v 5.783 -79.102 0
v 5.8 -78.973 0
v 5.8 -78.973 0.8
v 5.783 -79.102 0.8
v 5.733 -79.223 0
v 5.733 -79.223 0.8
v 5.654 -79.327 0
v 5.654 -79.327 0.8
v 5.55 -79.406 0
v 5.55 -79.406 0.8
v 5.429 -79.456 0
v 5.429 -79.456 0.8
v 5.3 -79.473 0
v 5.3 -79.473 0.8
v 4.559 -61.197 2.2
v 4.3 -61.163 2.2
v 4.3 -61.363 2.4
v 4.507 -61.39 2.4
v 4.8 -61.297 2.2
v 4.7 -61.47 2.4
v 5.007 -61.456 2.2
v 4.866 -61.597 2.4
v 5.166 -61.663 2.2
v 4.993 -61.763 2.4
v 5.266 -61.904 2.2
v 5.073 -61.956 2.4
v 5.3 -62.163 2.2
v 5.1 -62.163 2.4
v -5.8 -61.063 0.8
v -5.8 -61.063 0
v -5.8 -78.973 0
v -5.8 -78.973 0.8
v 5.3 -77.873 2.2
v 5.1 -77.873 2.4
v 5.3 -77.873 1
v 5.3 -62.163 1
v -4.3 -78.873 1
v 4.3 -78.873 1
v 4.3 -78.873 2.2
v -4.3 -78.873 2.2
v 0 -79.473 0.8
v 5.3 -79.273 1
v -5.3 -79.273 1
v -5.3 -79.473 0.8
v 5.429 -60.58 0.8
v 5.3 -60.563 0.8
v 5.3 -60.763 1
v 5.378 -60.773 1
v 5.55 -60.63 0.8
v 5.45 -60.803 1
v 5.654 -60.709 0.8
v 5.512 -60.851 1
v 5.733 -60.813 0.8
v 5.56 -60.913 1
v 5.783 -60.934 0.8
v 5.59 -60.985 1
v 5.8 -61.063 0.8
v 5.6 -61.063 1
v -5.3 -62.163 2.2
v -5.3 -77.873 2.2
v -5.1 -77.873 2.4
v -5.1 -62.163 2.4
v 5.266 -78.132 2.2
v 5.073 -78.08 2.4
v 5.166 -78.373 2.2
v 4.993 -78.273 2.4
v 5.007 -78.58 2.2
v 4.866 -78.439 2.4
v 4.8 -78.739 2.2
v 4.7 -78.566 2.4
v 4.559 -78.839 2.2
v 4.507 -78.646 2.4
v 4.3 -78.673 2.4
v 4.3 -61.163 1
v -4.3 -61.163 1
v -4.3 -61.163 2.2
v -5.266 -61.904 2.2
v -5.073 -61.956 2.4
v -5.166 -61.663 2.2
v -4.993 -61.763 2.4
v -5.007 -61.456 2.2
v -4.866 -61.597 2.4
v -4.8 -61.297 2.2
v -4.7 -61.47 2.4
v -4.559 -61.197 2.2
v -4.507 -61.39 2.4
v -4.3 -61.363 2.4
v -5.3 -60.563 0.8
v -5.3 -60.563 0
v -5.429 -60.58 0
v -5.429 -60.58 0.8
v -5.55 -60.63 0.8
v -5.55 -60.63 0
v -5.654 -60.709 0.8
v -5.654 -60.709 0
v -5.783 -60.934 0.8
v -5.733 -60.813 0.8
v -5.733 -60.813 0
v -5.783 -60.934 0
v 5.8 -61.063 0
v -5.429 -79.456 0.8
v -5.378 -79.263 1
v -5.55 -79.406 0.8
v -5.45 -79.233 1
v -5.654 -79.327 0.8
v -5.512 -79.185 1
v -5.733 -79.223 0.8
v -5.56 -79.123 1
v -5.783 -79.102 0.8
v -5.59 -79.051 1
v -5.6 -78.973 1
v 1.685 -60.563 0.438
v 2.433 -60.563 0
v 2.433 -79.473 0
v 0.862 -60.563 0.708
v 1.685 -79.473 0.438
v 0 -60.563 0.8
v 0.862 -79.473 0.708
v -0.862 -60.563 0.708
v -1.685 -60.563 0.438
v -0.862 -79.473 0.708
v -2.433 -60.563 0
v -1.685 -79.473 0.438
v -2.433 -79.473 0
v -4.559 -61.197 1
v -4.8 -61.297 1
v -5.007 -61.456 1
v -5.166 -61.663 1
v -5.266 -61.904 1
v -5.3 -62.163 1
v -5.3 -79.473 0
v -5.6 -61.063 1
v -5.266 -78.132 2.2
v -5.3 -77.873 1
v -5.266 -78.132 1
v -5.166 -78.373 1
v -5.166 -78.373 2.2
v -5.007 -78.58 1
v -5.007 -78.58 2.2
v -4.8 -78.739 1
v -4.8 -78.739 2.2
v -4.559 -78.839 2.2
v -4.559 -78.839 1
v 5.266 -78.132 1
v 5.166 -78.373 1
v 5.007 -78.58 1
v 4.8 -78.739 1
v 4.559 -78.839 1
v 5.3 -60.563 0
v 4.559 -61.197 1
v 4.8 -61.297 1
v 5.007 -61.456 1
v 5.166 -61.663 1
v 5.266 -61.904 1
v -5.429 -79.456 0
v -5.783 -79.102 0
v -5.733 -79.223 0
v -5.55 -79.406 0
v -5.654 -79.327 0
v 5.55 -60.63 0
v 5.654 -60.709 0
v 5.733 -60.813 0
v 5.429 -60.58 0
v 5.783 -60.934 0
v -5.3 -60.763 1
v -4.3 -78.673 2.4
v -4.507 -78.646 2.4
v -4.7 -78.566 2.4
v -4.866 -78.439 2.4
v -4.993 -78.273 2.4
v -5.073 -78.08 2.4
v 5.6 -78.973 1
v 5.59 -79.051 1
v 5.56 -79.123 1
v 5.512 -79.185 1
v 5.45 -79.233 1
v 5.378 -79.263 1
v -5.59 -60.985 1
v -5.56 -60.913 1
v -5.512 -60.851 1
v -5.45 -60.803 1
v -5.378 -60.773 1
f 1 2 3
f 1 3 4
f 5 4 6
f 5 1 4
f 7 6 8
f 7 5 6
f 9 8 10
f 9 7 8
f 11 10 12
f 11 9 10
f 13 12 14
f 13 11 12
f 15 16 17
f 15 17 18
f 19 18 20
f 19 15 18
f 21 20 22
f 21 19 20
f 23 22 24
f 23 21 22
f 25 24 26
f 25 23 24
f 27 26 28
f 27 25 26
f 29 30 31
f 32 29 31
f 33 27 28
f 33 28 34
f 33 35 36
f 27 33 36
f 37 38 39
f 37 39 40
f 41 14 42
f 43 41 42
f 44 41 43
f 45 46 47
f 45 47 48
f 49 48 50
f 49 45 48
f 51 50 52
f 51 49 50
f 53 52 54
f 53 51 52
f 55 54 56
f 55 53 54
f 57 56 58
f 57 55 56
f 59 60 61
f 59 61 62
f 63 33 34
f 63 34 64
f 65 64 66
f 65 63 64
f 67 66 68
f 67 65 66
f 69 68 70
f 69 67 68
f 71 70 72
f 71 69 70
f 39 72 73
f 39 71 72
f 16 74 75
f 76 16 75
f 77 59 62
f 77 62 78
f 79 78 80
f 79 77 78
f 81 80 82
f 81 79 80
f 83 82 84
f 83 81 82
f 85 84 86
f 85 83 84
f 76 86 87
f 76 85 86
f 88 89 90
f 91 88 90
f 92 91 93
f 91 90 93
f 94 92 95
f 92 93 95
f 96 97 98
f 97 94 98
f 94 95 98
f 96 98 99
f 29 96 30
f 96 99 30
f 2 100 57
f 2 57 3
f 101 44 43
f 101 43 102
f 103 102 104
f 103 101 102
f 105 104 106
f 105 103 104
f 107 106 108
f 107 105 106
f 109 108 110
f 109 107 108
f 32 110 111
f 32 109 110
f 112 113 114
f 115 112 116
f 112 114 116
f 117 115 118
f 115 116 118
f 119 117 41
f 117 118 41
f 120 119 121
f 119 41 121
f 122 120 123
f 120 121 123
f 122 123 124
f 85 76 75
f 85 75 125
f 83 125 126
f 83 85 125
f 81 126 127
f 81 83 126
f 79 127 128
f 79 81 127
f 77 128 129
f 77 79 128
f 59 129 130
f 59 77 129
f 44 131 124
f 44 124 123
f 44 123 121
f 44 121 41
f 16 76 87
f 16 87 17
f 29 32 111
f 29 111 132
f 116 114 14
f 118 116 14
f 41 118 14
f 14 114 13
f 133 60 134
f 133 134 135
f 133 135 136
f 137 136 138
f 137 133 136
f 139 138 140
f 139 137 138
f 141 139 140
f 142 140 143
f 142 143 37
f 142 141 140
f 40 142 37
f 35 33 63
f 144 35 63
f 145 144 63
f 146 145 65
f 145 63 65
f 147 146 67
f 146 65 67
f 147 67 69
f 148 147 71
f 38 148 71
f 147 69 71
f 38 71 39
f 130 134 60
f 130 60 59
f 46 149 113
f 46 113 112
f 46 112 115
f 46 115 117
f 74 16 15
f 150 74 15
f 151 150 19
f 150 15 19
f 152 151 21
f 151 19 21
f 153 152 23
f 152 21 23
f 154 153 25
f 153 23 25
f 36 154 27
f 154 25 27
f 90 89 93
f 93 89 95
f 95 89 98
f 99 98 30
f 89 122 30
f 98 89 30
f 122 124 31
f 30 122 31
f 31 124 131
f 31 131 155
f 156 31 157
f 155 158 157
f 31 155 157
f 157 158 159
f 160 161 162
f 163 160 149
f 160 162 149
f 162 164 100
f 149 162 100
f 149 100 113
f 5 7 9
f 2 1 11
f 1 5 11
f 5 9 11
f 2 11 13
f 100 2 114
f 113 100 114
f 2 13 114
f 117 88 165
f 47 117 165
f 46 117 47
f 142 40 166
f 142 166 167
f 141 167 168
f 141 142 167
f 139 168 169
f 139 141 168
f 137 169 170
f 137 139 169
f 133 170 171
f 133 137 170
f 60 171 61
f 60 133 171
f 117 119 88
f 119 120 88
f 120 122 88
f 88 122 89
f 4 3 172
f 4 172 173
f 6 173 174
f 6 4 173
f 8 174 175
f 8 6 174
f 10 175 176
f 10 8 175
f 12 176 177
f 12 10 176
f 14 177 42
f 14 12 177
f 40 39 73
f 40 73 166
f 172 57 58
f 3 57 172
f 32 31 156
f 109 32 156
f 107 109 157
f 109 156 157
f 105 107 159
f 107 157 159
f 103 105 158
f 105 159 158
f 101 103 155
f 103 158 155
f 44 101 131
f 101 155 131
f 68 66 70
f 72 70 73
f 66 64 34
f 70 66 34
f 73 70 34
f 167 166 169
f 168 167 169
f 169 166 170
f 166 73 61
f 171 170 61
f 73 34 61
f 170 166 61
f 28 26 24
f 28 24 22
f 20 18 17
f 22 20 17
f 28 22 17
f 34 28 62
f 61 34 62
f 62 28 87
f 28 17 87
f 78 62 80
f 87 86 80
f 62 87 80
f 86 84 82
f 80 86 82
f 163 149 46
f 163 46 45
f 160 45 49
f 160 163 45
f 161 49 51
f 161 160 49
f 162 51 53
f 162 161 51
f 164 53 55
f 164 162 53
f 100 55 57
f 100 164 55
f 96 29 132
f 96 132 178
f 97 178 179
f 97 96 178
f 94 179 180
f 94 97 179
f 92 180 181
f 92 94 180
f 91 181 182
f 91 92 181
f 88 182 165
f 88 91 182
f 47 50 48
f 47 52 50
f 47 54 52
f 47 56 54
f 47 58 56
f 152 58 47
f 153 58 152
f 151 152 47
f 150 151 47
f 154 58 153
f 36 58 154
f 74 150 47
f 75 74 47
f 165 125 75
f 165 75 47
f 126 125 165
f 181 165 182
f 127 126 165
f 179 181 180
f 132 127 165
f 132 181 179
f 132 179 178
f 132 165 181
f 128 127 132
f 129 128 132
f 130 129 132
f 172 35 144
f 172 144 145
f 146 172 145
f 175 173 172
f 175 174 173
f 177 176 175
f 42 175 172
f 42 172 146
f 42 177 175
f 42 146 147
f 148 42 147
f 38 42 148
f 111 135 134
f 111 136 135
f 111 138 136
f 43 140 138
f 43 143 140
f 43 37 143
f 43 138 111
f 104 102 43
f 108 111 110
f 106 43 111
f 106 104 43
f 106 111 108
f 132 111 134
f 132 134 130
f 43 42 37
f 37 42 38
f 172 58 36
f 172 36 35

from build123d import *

# Parameters (mm, degrees)
EXTRUDE_1_DEPTH     = 1
SKETCH_3_W          = 5.3
SKETCH_3_H          = 17.71
EXTRUDE_2_DEPTH     = 1.4
FILLET_1_R          = 1
CHAMFER_1_SIZE      = 0.2
CUT_EXTRUDE_1_DEPTH = 0.5
SKETCH_5_R          = 4.1
CUT_EXTRUDE_2_DEPTH = 20.924560345


with BuildPart() as part:
    # 草图1 → 凸台-拉伸1 (new body)
    with BuildSketch(Plane(origin=(0, 0, 0), x_dir=(-1, 0, 0), z_dir=(0, 0, 1))):
        with BuildLine():
            Line((-5.8, 61.063), (-5.8, 78.973))
            ThreePointArc((-5.8, 78.973), (-5.653553391, 79.32655339), (-5.3, 79.473))
            Line((-5.3, 79.473), (0, 79.473))
            Line((0, 79.473), (0, 60.563))
            Line((0, 60.563), (-5.3, 60.563))
            ThreePointArc((-5.3, 60.563), (-5.653553391, 60.709446609), (-5.8, 61.063))
        make_face()
    extrude(amount=EXTRUDE_1_DEPTH)

    # 草图3 → 凸台-拉伸2 (add)
    with BuildSketch(Plane.XY.offset(1)):
        with Locations((2.65, -70.018)):
            Rectangle(SKETCH_3_W, SKETCH_3_H)
    extrude(amount=EXTRUDE_2_DEPTH)

    # 圆角1
    fillet_1_edges = [part.edges().sort_by_distance(p)[0] for p in [
        (5.3, -61.163, 1.7),
        (5.3, -78.873, 1.7),
    ]]
    fillet(fillet_1_edges, radius=FILLET_1_R)

    # 镜向1: part across plane


with BuildPart() as part_1:
    add(part.part)
    add(part.part.mirror(Plane(origin=(0, -79.473, 1), x_dir=(0, 0, 1), z_dir=(1, 0, 0))))

    # 倒角1
    chamfer_1_edges = [part_1.edges().sort_by_distance(p)[0] for p in [
        (5.653553391, -60.709446609, 1),
        (0, -60.563, 1),
        (0, -79.473, 1),
        (0, -78.873, 2.4),
        (0, -61.163, 2.4),
        (5.3, -70.018, 2.4),
        (5.007106781, -78.580106781, 2.4),
        (5.007106781, -61.455893219, 2.4),
        (5.653553391, -79.32655339, 1),
        (-5.653553391, -79.32655339, 1),
        (-5.8, -70.018, 1),
        (-5.653553391, -60.709446609, 1),
        (-5.3, -70.018, 2.4),
        (-5.007106781, -61.455893219, 2.4),
        (-5.007106781, -78.580106781, 2.4),
        (5.8, -70.018, 1),
    ]]
    chamfer(chamfer_1_edges, length=CHAMFER_1_SIZE)

    # 草图4 → 切除-拉伸1 (cut)
    # profile 1 of 9: a face of its own
    with BuildSketch(Plane(origin=(-6.3, -79.273, 0), x_dir=(1, 0, 0), z_dir=(0, 0, 1))):
        with BuildLine():
            add(Edge.make_bspline(
                [(6.774685953, 2.619341222), (6.800289884, 2.617747441), (6.850993025, 2.614591298), (6.925350933, 2.600827188), (6.996555647, 2.579095321), (7.064787892, 2.55036601), (7.129545424, 2.513432463), (7.190880782, 2.468744026), (7.248477435, 2.416001945), (7.302842533, 2.356884778), (7.35236013, 2.291759099), (7.396108136, 2.221845326), (7.432464761, 2.147203781), (7.463443618, 2.069005381), (7.487749635, 1.986705734), (7.505943631, 1.900454217), (7.517046754, 1.809855564), (7.519723963, 1.747989925), (7.521090297, 1.716416298)],
                knots=[0, 0, 0, 0, 0.94827468, 1.87785632, 2.789222779, 3.697428247, 4.610539481, 5.540471281, 6.498511082, 7.494592211, 8.507455324, 9.520496994, 10.539928136, 11.574155348, 12.628388138, 13.710074165, 14.831317928, 16, 16, 16, 16], degree=3))
            add(Edge.make_bspline(
                [(7.521090297, 1.716416298), (7.519727673, 1.684841903), (7.517057736, 1.622974757), (7.505882914, 1.532228766), (7.487825449, 1.44578553), (7.463435671, 1.363341058), (7.432466847, 1.285140562), (7.396107558, 1.210499646), (7.352360383, 1.140585414), (7.302842101, 1.075460941), (7.248478866, 1.016339529), (7.190875764, 0.963612474), (7.129563419, 0.918870324), (7.064666385, 0.8821006), (6.996680813, 0.852631121), (6.925333473, 0.831071458), (6.85085853, 0.817225267), (6.800008805, 0.81409757), (6.774261029, 0.812513859)],
                knots=[0, 0, 0, 0, 1.167698527, 2.287998669, 3.374655933, 4.428001497, 5.461358319, 6.479931524, 7.492120634, 8.504131337, 9.49937418, 10.456607709, 11.385756894, 12.298099667, 13.207905618, 14.118505085, 15.047304403, 16, 16, 16, 16], degree=3))
            Line((6.774261029, 0.812513859), (5.874364878, 0.812513383))
            add(Edge.make_bspline(
                [(5.874364878, 0.812513383), (5.848582314, 0.814095492), (5.797697494, 0.817217963), (5.723188613, 0.831071719), (5.651841188, 0.852631022), (5.583855875, 0.882100737), (5.51895788, 0.918869872), (5.457649221, 0.963614201), (5.400031715, 1.016332762), (5.345724961, 1.075487473), (5.296042879, 1.140416594), (5.253101436, 1.210789424), (5.215889174, 1.284977516), (5.185189379, 1.363376877), (5.16048408, 1.445707285), (5.143464797, 1.53234091), (5.131246322, 1.622922352), (5.128720439, 1.684831116), (5.127431761, 1.716416298)],
                knots=[0, 0, 0, 0, 0.95395145, 1.882731614, 2.793312302, 3.703099491, 4.61542345, 5.544553474, 6.501767263, 7.496989581, 8.508979415, 9.51798526, 10.539210713, 11.572546226, 12.625870068, 13.71129126, 14.832325553, 16, 16, 16, 16], degree=3))
            add(Edge.make_bspline(
                [(5.127431761, 1.716416298), (5.128724004, 1.748000757), (5.131256875, 1.809908103), (5.143403843, 1.900341656), (5.160559346, 1.98678445), (5.185181741, 2.068969445), (5.215891185, 2.147366857), (5.25310088, 2.22155554), (5.296043126, 2.291927922), (5.34572453, 2.356858246), (5.400033145, 2.416008713), (5.457644204, 2.468742294), (5.518975873, 2.513432931), (5.583734371, 2.550365816), (5.651966341, 2.579095634), (5.723171201, 2.600826114), (5.797668042, 2.614621182), (5.84851477, 2.617755875), (5.874261029, 2.619343127)],
                knots=[0, 0, 0, 0, 1.168370235, 2.290072524, 3.370248926, 4.424200417, 5.458151668, 6.479985644, 7.489592731, 8.502185584, 9.49800093, 10.455785099, 11.385468768, 12.298336358, 13.206299492, 14.117422773, 15.046756374, 16, 16, 16, 16], degree=3))
            Line((5.874261029, 2.619343127), (6.774685953, 2.619341222))
        make_face()
        with BuildLine():
            add(Edge.make_bspline(
                [(5.874364878, 2.18617049), (5.86113587, 2.185267658), (5.835045805, 2.183487104), (5.79678859, 2.176788791), (5.760246428, 2.165443937), (5.725755638, 2.149641161), (5.69249254, 2.130544277), (5.661323751, 2.106825267), (5.631484581, 2.079504237), (5.603694252, 2.048280435), (5.578897378, 2.013833692), (5.555843962, 1.97776793), (5.537622496, 1.938845079), (5.521924163, 1.898272763), (5.509143347, 1.855747659), (5.499912343, 1.81103202), (5.493993624, 1.764373863), (5.492875607, 1.732531075), (5.492309809, 1.716416298)],
                knots=[0, 0, 0, 0, 0.94951791, 1.872625918, 2.77529632, 3.682465107, 4.58551123, 5.517397007, 6.48198038, 7.480297679, 8.505438217, 9.520402585, 10.541564555, 11.577763819, 12.635477268, 13.718356008, 14.845321508, 16, 16, 16, 16], degree=3))
            add(Edge.make_bspline(
                [(5.492309809, 1.716416298), (5.492857379, 1.700136765), (5.493928619, 1.668288231), (5.500023035, 1.621494625), (5.509062818, 1.576743135), (5.521933098, 1.534073731), (5.537620202, 1.493499339), (5.55584442, 1.454576696), (5.578897807, 1.418512125), (5.603692071, 1.384060416), (5.631492514, 1.352854654), (5.661295601, 1.325469556), (5.692658583, 1.301928208), (5.725481785, 1.282014249), (5.76038668, 1.267018076), (5.796824481, 1.255662821), (5.834957769, 1.248228341), (5.861058575, 1.246539068), (5.874261029, 1.245684591)],
                knots=[0, 0, 0, 0, 1.165413886, 2.279962417, 3.373403418, 4.430302031, 5.465703032, 6.486078323, 7.500260788, 8.524611583, 9.522159802, 10.486000083, 11.417167958, 12.325429624, 13.227179297, 14.129154303, 15.053678456, 16, 16, 16, 16], degree=3))
            Line((5.874261029, 1.245684591), (6.774685953, 1.245684114))
            add(Edge.make_bspline(
                [(6.774685953, 1.245684114), (6.787745984, 1.246546478), (6.813702874, 1.248260432), (6.85169766, 1.255661522), (6.888135352, 1.267018422), (6.923040295, 1.28201415), (6.955863413, 1.301928256), (6.987226694, 1.325469461), (7.017028613, 1.352855001), (7.044833635, 1.384059065), (7.069610307, 1.418517288), (7.092729184, 1.454557611), (7.110731768, 1.493625448), (7.127361515, 1.533865439), (7.139254764, 1.576854956), (7.148558015, 1.62147613), (7.15457778, 1.66829314), (7.155659382, 1.700138425), (7.156212248, 1.716416298)],
                knots=[0, 0, 0, 0, 0.936755952, 1.861807968, 2.764297963, 3.666562496, 4.57534274, 5.507042272, 6.471432864, 7.469550641, 8.494486296, 9.509247815, 10.530205697, 11.570444156, 12.624670514, 13.718735822, 14.833920713, 16, 16, 16, 16], degree=3))
            add(Edge.make_bspline(
                [(7.156212248, 1.716416298), (7.155641228, 1.732529437), (7.154512891, 1.76436899), (7.148669168, 1.811050658), (7.139176923, 1.855636664), (7.127370725, 1.898481139), (7.110729405, 1.938718949), (7.09272966, 1.977787021), (7.069610731, 2.013828528), (7.044831455, 2.048281786), (7.017036546, 2.079503891), (6.987198544, 2.106825357), (6.956029457, 2.130544245), (6.922766438, 2.149641201), (6.888275615, 2.165443807), (6.851733507, 2.176789272), (6.813510111, 2.183479294), (6.787455247, 2.185267066), (6.774261029, 2.186172396)],
                knots=[0, 0, 0, 0, 1.154786464, 2.281857345, 3.364837343, 4.419373038, 5.45991673, 6.481174187, 7.496233464, 8.521469861, 9.519880511, 10.48455408, 11.416526997, 12.319657563, 13.226911178, 14.129665987, 15.052860313, 16, 16, 16, 16], degree=3))
            Line((6.774261029, 2.186172396), (5.874364878, 2.18617049))
        make_face(mode=Mode.SUBTRACT)
    # profile 2 of 9: a face of its own
    with BuildSketch(Plane(origin=(-6.3, -79.273, 0), x_dir=(1, 0, 0), z_dir=(0, 0, 1))):
        with BuildLine():
            add(Edge.make_bspline(
                [(5.122553712, 3.453167823), (5.12340021, 3.467672021), (5.125038308, 3.495739767), (5.134857134, 3.535708094), (5.15084215, 3.571615935), (5.171977078, 3.603340165), (5.198395949, 3.629166179), (5.22817408, 3.64895025), (5.261862274, 3.661055693), (5.285548184, 3.663213773), (5.297675663, 3.664318737)],
                knots=[0, 0, 0, 0, 1.145665256, 2.217029971, 3.22878967, 4.236712138, 5.208316078, 6.12723863, 7.041122994, 8, 8, 8, 8], degree=3))
            add(Edge.make_bspline(
                [(5.297675663, 3.664318737), (5.310122186, 3.663206732), (5.33443065, 3.66103495), (5.368987459, 3.649086498), (5.399379978, 3.629184196), (5.426253229, 3.60336187), (5.447983758, 3.571761313), (5.463881871, 3.535690792), (5.473698895, 3.495880496), (5.475358587, 3.467952021), (5.476212248, 3.45358703)],
                knots=[0, 0, 0, 0, 0.976287191, 1.906720606, 2.828835859, 3.801627679, 4.808505341, 5.811994192, 6.874600806, 8, 8, 8, 8], degree=3))
            add(Edge.make_bspline(
                [(5.476212248, 3.45358703), (5.480216962, 3.447859363), (5.487865871, 3.436919654), (5.502441531, 3.424264246), (5.517821852, 3.414109466), (5.52941433, 3.411163965), (5.535236639, 3.409684591)],
                knots=[0, 0, 0, 0, 1.106007569, 2.112448186, 3.051979138, 4, 4, 4, 4], degree=3))
            Line((5.535236639, 3.409684591), (7.351157942, 3.409428779))
            add(Edge.make_bspline(
                [(7.351157942, 3.409428779), (7.363032707, 3.408634539), (7.386353933, 3.407074704), (7.419452124, 3.394599253), (7.449164286, 3.375211888), (7.474895075, 3.349048859), (7.49636043, 3.317915263), (7.51212455, 3.282375719), (7.521458304, 3.2428273), (7.523140678, 3.215263653), (7.524017127, 3.200904103)],
                knots=[0, 0, 0, 0, 0.946687369, 1.85922917, 2.78909143, 3.763031202, 4.772218789, 5.796023415, 6.851816938, 8, 8, 8, 8], degree=3))
            add(Edge.make_bspline(
                [(7.524017127, 3.200904103), (7.523123946, 3.186548133), (7.521399624, 3.158833342), (7.512216042, 3.11908638), (7.496359803, 3.083397058), (7.474872087, 3.052306475), (7.449313234, 3.026047522), (7.419299783, 3.007245461), (7.38622211, 2.99484166), (7.362825457, 2.992721388), (7.350846395, 2.99163581)],
                knots=[0, 0, 0, 0, 1.145841184, 2.212093514, 3.233809949, 4.240939159, 5.212892446, 6.133855195, 7.044535741, 8, 8, 8, 8], degree=3))
            Line((7.350846395, 2.99163581), (5.535616307, 2.991635334))
            add(Edge.make_bspline(
                [(5.535616307, 2.991635334), (5.52147394, 2.992480055), (5.49363036, 2.994143146), (5.452972897, 3.001658491), (5.413960119, 3.012817345), (5.376895286, 3.028564797), (5.341534007, 3.048135935), (5.308200847, 3.071907721), (5.276203383, 3.099205853), (5.2469093, 3.130975337), (5.219565994, 3.165116772), (5.196258227, 3.202191078), (5.17545916, 3.240584189), (5.158893435, 3.281543237), (5.145670067, 3.32463437), (5.136114026, 3.369868117), (5.129530146, 3.417147533), (5.128141278, 3.44933755), (5.127431761, 3.465782152)],
                knots=[0, 0, 0, 0, 0.980581761, 1.930575478, 2.857315967, 3.786107525, 4.713805743, 5.651298114, 6.617643132, 7.621653236, 8.640152693, 9.643088211, 10.650818869, 11.661064142, 12.697834104, 13.769264831, 14.860405998, 16, 16, 16, 16], degree=3))
            Line((5.127431761, 3.465782152), (5.122553712, 3.453167823))
        make_face()
    # profile 3 of 9: a face of its own
    with BuildSketch(Plane(origin=(-6.3, -79.273, 0), x_dir=(1, 0, 0), z_dir=(0, 0, 1))):
        with BuildLine():
            add(Edge.make_bspline(
                [(5.64191061, 4.015635334), (5.62418692, 4.016672194), (5.589410752, 4.018706648), (5.538711188, 4.029035747), (5.489880743, 4.043323024), (5.443556301, 4.064333492), (5.398638366, 4.089469286), (5.356819988, 4.121296249), (5.31645088, 4.157335619), (5.279374608, 4.198926822), (5.244666177, 4.243708141), (5.214964972, 4.292546569), (5.189080472, 4.343711052), (5.167290141, 4.397624369), (5.151133226, 4.454484915), (5.138049576, 4.513703407), (5.130484169, 4.575946091), (5.128462736, 4.618382529), (5.127431761, 4.640026054)],
                knots=[0, 0, 0, 0, 0.951543996, 1.867052271, 2.76966306, 3.675977574, 4.590487385, 5.525863222, 6.489621794, 7.490352572, 8.511268695, 9.525901277, 10.552172671, 11.585909569, 12.640644114, 13.72052336, 14.837416339, 16, 16, 16, 16], degree=3))
            Line((5.127431761, 4.640026054), (5.127431761, 5.322837125))
            add(Edge.make_bspline(
                [(5.127431761, 5.322837125), (5.128250913, 5.337736061), (5.129824967, 5.366365347), (5.139987455, 5.407436865), (5.155825325, 5.444890846), (5.178604209, 5.47731656), (5.204929139, 5.505304452), (5.236568776, 5.524782379), (5.270919484, 5.538525945), (5.295427639, 5.540488927), (5.307919566, 5.541489469)],
                knots=[0, 0, 0, 0, 1.138391563, 2.187494374, 3.217350047, 4.227515487, 5.203137744, 6.130703494, 7.047210442, 8, 8, 8, 8], degree=3))
            Line((5.307919566, 5.541489469), (7.350097538, 5.54148804))
            add(Edge.make_bspline(
                [(7.350097538, 5.54148804), (7.362019452, 5.540454253), (7.385642998, 5.538405781), (7.418758057, 5.524904351), (7.449029163, 5.505054328), (7.474420765, 5.477310228), (7.495936614, 5.444581323), (7.51215364, 5.407546654), (7.521430449, 5.366314652), (7.523131708, 5.337795596), (7.524017127, 5.322952884)],
                knots=[0, 0, 0, 0, 0.925618035, 1.834133467, 2.745721925, 3.720426658, 4.733716554, 5.781128243, 6.845190584, 8, 8, 8, 8], degree=3))
            add(Edge.make_bspline(
                [(7.524017127, 5.322952884), (7.523107834, 5.308280032), (7.521351466, 5.2799383), (7.512362947, 5.239073206), (7.495747355, 5.202712365), (7.474620937, 5.170462674), (7.448653567, 5.143878083), (7.419009351, 5.123639979), (7.385339341, 5.11166282), (7.36182959, 5.109446249), (7.349870785, 5.108318737)],
                knots=[0, 0, 0, 0, 1.151935465, 2.225051238, 3.25803624, 4.269315285, 5.233953352, 6.153297938, 7.060630248, 8, 8, 8, 8], degree=3))
            Line((7.349870785, 5.108318737), (6.803528845, 5.108317308))
            Line((6.803528845, 5.108317308), (6.803528845, 4.639603512))
            add(Edge.make_bspline(
                [(6.803528845, 4.639603512), (6.802290695, 4.618102812), (6.799855864, 4.575821562), (6.792411473, 4.513714228), (6.77948342, 4.454393814), (6.762573248, 4.39770287), (6.740876127, 4.34374342), (6.715193156, 4.29222938), (6.684163021, 4.244033886), (6.64973905, 4.198701185), (6.612022193, 4.157530973), (6.571695976, 4.121099589), (6.529439484, 4.089624077), (6.484493641, 4.06431863), (6.438017684, 4.043229486), (6.38882481, 4.029046753), (6.337912754, 4.018765438), (6.303091671, 4.016687002), (6.285480541, 4.01563581)],
                knots=[0, 0, 0, 0, 1.15353325, 2.268429813, 3.346378802, 4.401710962, 5.433600081, 6.458037042, 7.480101589, 8.49919285, 9.504003122, 10.466039, 11.406744591, 12.319619739, 13.224314239, 14.133650694, 15.056074184, 16, 16, 16, 16], degree=3))
            Line((6.285480541, 4.01563581), (5.64191061, 4.015635334))
        make_face()
        with BuildLine():
            Line((6.438650796, 5.108317308), (5.492309809, 5.108317308))
            Line((5.492309809, 5.108317308), (5.492309809, 4.639603512))
            add(Edge.make_bspline(
                [(5.492309809, 4.639603512), (5.493077384, 4.626854886), (5.494568825, 4.602083581), (5.502934273, 4.566392938), (5.516722182, 4.533964421), (5.535081683, 4.504972131), (5.557862762, 4.481392794), (5.583154974, 4.46288615), (5.611654141, 4.451854311), (5.631573047, 4.449825561), (5.641578102, 4.448806542)],
                knots=[0, 0, 0, 0, 1.146504479, 2.227723435, 3.275533308, 4.301194785, 5.293513974, 6.205873749, 7.098829466, 8, 8, 8, 8], degree=3))
            Line((5.641578102, 4.448806542), (6.285844489, 4.448806066))
            add(Edge.make_bspline(
                [(6.285844489, 4.448806066), (6.296212211, 4.44982502), (6.3167979, 4.451848211), (6.346183743, 4.462760386), (6.372108628, 4.481218509), (6.394827087, 4.505134863), (6.413844194, 4.533796497), (6.427502788, 4.566416747), (6.435949568, 4.602214344), (6.437408591, 4.627133344), (6.438163468, 4.640026054)],
                knots=[0, 0, 0, 0, 0.923098965, 1.832864354, 2.746636279, 3.727612043, 4.749444418, 5.785276539, 6.854135836, 8, 8, 8, 8], degree=3))
            Line((6.438163468, 4.640026054), (6.438650796, 5.108317308))
        make_face(mode=Mode.SUBTRACT)
    # profile 4 of 9: a face of its own
    with BuildSketch(Plane(origin=(-6.3, -79.273, 0), x_dir=(1, 0, 0), z_dir=(0, 0, 1))):
        with BuildLine():
            add(Edge.make_bspline(
                [(5.483332104, 6.683303874), (5.485448601, 6.660339253), (5.489567034, 6.615653039), (5.507466294, 6.55214269), (5.533965242, 6.494781844), (5.568481512, 6.444664895), (5.609160677, 6.402696154), (5.655680896, 6.371794268), (5.707143141, 6.352224953), (5.743200913, 6.348732729), (5.761578102, 6.346952884)],
                knots=[0, 0, 0, 0, 1.152723077, 2.243051527, 3.284729085, 4.303178847, 5.27606439, 6.192795705, 7.078941055, 8, 8, 8, 8], degree=3))
            Line((5.761578102, 6.346952884), (6.884809809, 6.346952407))
            add(Edge.make_bspline(
                [(6.884809809, 6.346952407), (6.90322765, 6.348779539), (6.939611667, 6.352388996), (6.991579538, 6.3713876), (7.037901787, 6.402927247), (7.07858593, 6.444396049), (7.112275291, 6.494672608), (7.136494832, 6.552187645), (7.152833107, 6.615506922), (7.15505989, 6.660016677), (7.156212248, 6.683050444)],
                knots=[0, 0, 0, 0, 0.927308887, 1.831877266, 2.745000803, 3.72128324, 4.73410518, 5.766054053, 6.84393453, 8, 8, 8, 8], degree=3))
            Line((7.156212248, 6.683050444), (7.156699101, 7.506842842))
            add(Edge.make_bspline(
                [(7.156699101, 7.506842842), (7.157267736, 7.521752002), (7.15836245, 7.550454493), (7.169211989, 7.591130776), (7.185160446, 7.627799989), (7.207367072, 7.659552325), (7.233782279, 7.686466311), (7.265518526, 7.704833698), (7.299900939, 7.718223453), (7.324533916, 7.719801023), (7.337187858, 7.72061142)],
                knots=[0, 0, 0, 0, 1.147643246, 2.209394622, 3.225718433, 4.217360048, 5.184177568, 6.107033161, 7.027584279, 8, 8, 8, 8], degree=3))
            add(Edge.make_bspline(
                [(7.337187858, 7.72061142), (7.349837634, 7.719784268), (7.374616041, 7.718164041), (7.4093191, 7.704836061), (7.441571992, 7.686514837), (7.468412835, 7.659431917), (7.491674799, 7.627996843), (7.508194071, 7.591225706), (7.518788774, 7.550459721), (7.520303883, 7.521818855), (7.521090297, 7.506952884)],
                knots=[0, 0, 0, 0, 0.966444608, 1.893073575, 2.820959557, 3.790775214, 4.790729761, 5.805954028, 6.861185726, 8, 8, 8, 8], degree=3))
            Line((7.521090297, 7.506952884), (7.521577626, 6.682651721))
            add(Edge.make_bspline(
                [(7.521577626, 6.682651721), (7.520290355, 6.655932055), (7.517756712, 6.60334165), (7.508204044, 6.526077658), (7.492279587, 6.452329157), (7.47221742, 6.381756472), (7.445639818, 6.315223406), (7.413721687, 6.252150323), (7.37613937, 6.192833938), (7.333823803, 6.137230744), (7.287493055, 6.08684508), (7.237749143, 6.042714299), (7.186060307, 6.004171902), (7.131049985, 5.972662737), (7.073031373, 5.94846772), (7.012730968, 5.929523167), (6.949483678, 5.917764278), (6.906339752, 5.915120266), (6.884504931, 5.913782152)],
                knots=[0, 0, 0, 0, 1.161612702, 2.286319017, 3.376369762, 4.435675978, 5.469053187, 6.482868206, 7.501688539, 8.514420738, 9.513942875, 10.469304235, 11.398707525, 12.309683497, 13.214727573, 14.123867699, 15.050503342, 16, 16, 16, 16], degree=3))
            Line((6.884504931, 5.913782152), (5.761762934, 5.913781675))
            add(Edge.make_bspline(
                [(5.761762934, 5.913781675), (5.739864807, 5.91510768), (5.696815317, 5.91771447), (5.633835378, 5.929530089), (5.574009923, 5.948452425), (5.516389878, 5.972788267), (5.461473219, 6.004152159), (5.409825676, 6.042741852), (5.360030826, 6.086677909), (5.314278447, 6.13743025), (5.271776508, 6.192654242), (5.234949454, 6.25233275), (5.202664334, 6.315071906), (5.177142736, 6.381982932), (5.155828859, 6.452142625), (5.141232226, 6.526210521), (5.130389713, 6.603399023), (5.128429531, 6.656182598), (5.127431761, 6.683050444)],
                knots=[0, 0, 0, 0, 0.953463774, 1.874412746, 2.778039622, 3.677811996, 4.590031397, 5.520703266, 6.477368638, 7.473472036, 8.487586555, 9.504040725, 10.519239542, 11.551438491, 12.614192351, 13.704286828, 14.831438197, 16, 16, 16, 16], degree=3))
            Line((5.127431761, 6.683050444), (5.127431761, 7.506842842))
            add(Edge.make_bspline(
                [(5.127431761, 7.506842842), (5.128215456, 7.521745818), (5.129723547, 7.55042409), (5.140328109, 7.591225717), (5.156847228, 7.62799684), (5.180109231, 7.659431918), (5.206950064, 7.686514837), (5.239202958, 7.704836061), (5.273906017, 7.718164041), (5.298684423, 7.719784268), (5.3113342, 7.72061142)],
                knots=[0, 0, 0, 0, 1.141216098, 2.196078402, 3.21094728, 4.210551784, 5.180027947, 6.107589113, 7.033893705, 8, 8, 8, 8], degree=3))
            Line((5.3113342, 7.72061142), (6.432056856, 7.720609515))
            add(Edge.make_bspline(
                [(6.432056856, 7.720609515), (6.444626919, 7.719775004), (6.469324055, 7.718135394), (6.503953123, 7.704836181), (6.536206173, 7.686514803), (6.563046972, 7.659431927), (6.586308948, 7.62799684), (6.602828216, 7.591225706), (6.61342292, 7.55045972), (6.61493803, 7.521818855), (6.615724444, 7.506952884)],
                knots=[0, 0, 0, 0, 0.961194782, 1.888515383, 2.817093936, 3.78763346, 4.788334371, 5.804316398, 6.860335719, 8, 8, 8, 8], degree=3))
            Line((6.615724444, 7.506952884), (6.616211772, 7.099417156))
            add(Edge.make_bspline(
                [(6.616211772, 7.099417156), (6.615174296, 7.0846407), (6.613149653, 7.055804318), (6.603101094, 7.01462041), (6.585997525, 6.977513664), (6.563302412, 6.945172497), (6.535900348, 6.917885648), (6.504415004, 6.897557286), (6.469159674, 6.884730978), (6.444447642, 6.882650148), (6.431822005, 6.88158703)],
                knots=[0, 0, 0, 0, 1.124580428, 2.194628496, 3.201054364, 4.212475683, 5.182505617, 6.121819445, 7.040417821, 8, 8, 8, 8], degree=3))
            add(Edge.make_bspline(
                [(6.431822005, 6.88158703), (6.419192642, 6.882633793), (6.394626369, 6.884669928), (6.359687788, 6.897566799), (6.328725094, 6.917929803), (6.301744847, 6.945059546), (6.280103088, 6.977699919), (6.263576791, 7.01471797), (6.253257069, 7.055840858), (6.251664174, 7.084779137), (6.250846395, 7.09963581)],
                knots=[0, 0, 0, 0, 0.965072278, 1.877230911, 2.811477289, 3.778228858, 4.781367767, 5.788425953, 6.864596133, 8, 8, 8, 8], degree=3))
            Line((6.250846395, 7.09963581), (6.251333723, 7.289011287))
            Line((6.251333723, 7.289011287), (5.492309809, 7.289011287))
            Line((5.492309809, 7.289011287), (5.483332104, 6.683303874))
        make_face()
    # profile 5 of 9: a face of its own
    with BuildSketch(Plane(origin=(-6.3, -79.273, 0), x_dir=(1, 0, 0), z_dir=(0, 0, 1))):
        with BuildLine():
            Line((5.78304104, 9.618756332), (6.188556951, 9.618756332))
            add(Edge.make_bspline(
                [(6.188556951, 9.618756332), (6.20921028, 9.617424091), (6.25021646, 9.614778991), (6.310224261, 9.602836565), (6.368059337, 9.584715601), (6.423300601, 9.559623746), (6.476255126, 9.528172504), (6.526887665, 9.490349774), (6.574647905, 9.445597887), (6.619738365, 9.395175205), (6.660880208, 9.33974351), (6.697817212, 9.280782527), (6.72840163, 9.217780899), (6.754455756, 9.151812631), (6.77499374, 9.082103096), (6.789882057, 9.008982988), (6.799912806, 8.932513711), (6.80198574, 8.880414585), (6.803041517, 8.853879713)],
                knots=[0, 0, 0, 0, 0.916292159, 1.819253497, 2.703419541, 3.59669853, 4.501239603, 5.427838288, 6.391433554, 7.39669121, 8.421284483, 9.447017191, 10.474949228, 11.519936788, 12.586900617, 13.690530484, 14.823752287, 16, 16, 16, 16], degree=3))
            add(Edge.make_bspline(
                [(6.803041517, 8.853879713), (6.801991066, 8.827506958), (6.799935202, 8.775892193), (6.789895271, 8.700229631), (6.774917369, 8.627945936), (6.754483642, 8.558853928), (6.728264486, 8.49329012), (6.697972855, 8.430460484), (6.660724446, 8.371848968), (6.61973283, 8.316502426), (6.574812011, 8.266046617), (6.526718885, 8.221818831), (6.476272071, 8.183966763), (6.423309506, 8.152487097), (6.367962696, 8.127576356), (6.310324824, 8.108673205), (6.250154318, 8.096913528), (6.209106375, 8.094248155), (6.18840737, 8.092904103)],
                knots=[0, 0, 0, 0, 1.173145474, 2.295991786, 3.389326865, 4.45309377, 5.495012025, 6.526542102, 7.549726577, 8.577906204, 9.586682534, 10.54874524, 11.478587271, 12.386294483, 13.282700191, 14.172167919, 15.078289867, 16, 16, 16, 16], degree=3))
            Line((6.18840737, 8.092904103), (5.636103636, 8.092903627))
            add(Edge.make_bspline(
                [(5.636103636, 8.092903627), (5.618687056, 8.093934407), (5.584535712, 8.095955615), (5.534660082, 8.106389949), (5.486577854, 8.120495843), (5.441086989, 8.14160516), (5.397093531, 8.16689898), (5.355797397, 8.198536118), (5.315992164, 8.234797685), (5.278775096, 8.275988312), (5.244848096, 8.321319122), (5.214251408, 8.369500662), (5.189238795, 8.421146272), (5.167239086, 8.474865326), (5.151147367, 8.531760779), (5.138045627, 8.590969586), (5.130485218, 8.653214945), (5.12846309, 8.695651011), (5.127431761, 8.717294347)],
                knots=[0, 0, 0, 0, 0.940339096, 1.843866273, 2.743250278, 3.638729962, 4.543279326, 5.476985431, 6.43976515, 7.446225619, 8.46768576, 9.492758237, 10.520981099, 11.560636664, 12.621410099, 13.7074722, 14.830759959, 16, 16, 16, 16], degree=3))
            Line((5.127431761, 8.717294347), (5.127431761, 9.400105418))
            add(Edge.make_bspline(
                [(5.127431761, 9.400105418), (5.128250913, 9.415004353), (5.129824967, 9.44363364), (5.139987455, 9.484705158), (5.155825325, 9.522159138), (5.178604209, 9.554584853), (5.204929139, 9.582572745), (5.236568776, 9.602050672), (5.270919484, 9.615794238), (5.295427639, 9.61775722), (5.307919566, 9.618757762)],
                knots=[0, 0, 0, 0, 1.138391563, 2.187494374, 3.217350047, 4.227515487, 5.203137744, 6.130703494, 7.047210442, 8, 8, 8, 8], degree=3))
            add(Edge.make_bspline(
                [(5.307919566, 9.618757762), (5.32072935, 9.617750831), (5.345855745, 9.615775737), (5.381095419, 9.602192177), (5.413291131, 9.58256816), (5.440201847, 9.554767849), (5.462849585, 9.522028989), (5.479258076, 9.484763258), (5.490030442, 9.443733292), (5.491530966, 9.415088952), (5.492309809, 9.400221176)],
                knots=[0, 0, 0, 0, 0.968685772, 1.900077285, 2.829756606, 3.805310362, 4.806426797, 5.832025487, 6.874718055, 8, 8, 8, 8], degree=3))
            Line((5.492309809, 9.400221176), (5.492309809, 8.716871805))
            add(Edge.make_bspline(
                [(5.492309809, 8.716871805), (5.493121393, 8.704130558), (5.494696036, 8.67940987), (5.502425299, 8.643713627), (5.515686632, 8.611215702), (5.533679104, 8.58264992), (5.554904773, 8.558360054), (5.579553615, 8.54049395), (5.606848713, 8.529011256), (5.626024821, 8.527061206), (5.635724444, 8.526074835)],
                knots=[0, 0, 0, 0, 1.165164728, 2.260663639, 3.319814879, 4.354202631, 5.332356577, 6.247471425, 7.113539359, 8, 8, 8, 8], degree=3))
            Line((5.635724444, 8.526074835), (5.78304104, 8.526074358))
            Line((5.78304104, 8.526074358), (5.78304104, 9.618756332))
        make_face()
        with BuildLine():
            add(Edge.make_bspline(
                [(6.438650796, 8.853748234), (6.437369986, 8.876315935), (6.43489599, 8.919907417), (6.420310671, 8.98225033), (6.398165916, 9.039098475), (6.366950975, 9.088679973), (6.32961579, 9.129955935), (6.287092094, 9.161238575), (6.239214168, 9.180828947), (6.205492452, 9.183987003), (6.18840737, 9.18558703)],
                knots=[0, 0, 0, 0, 1.181532699, 2.282233465, 3.336661472, 4.361780037, 5.331867908, 6.234422029, 7.105471251, 8, 8, 8, 8], degree=3))
            Line((6.18840737, 9.18558703), (6.147919566, 9.185585601))
            Line((6.147919566, 9.185585601), (6.147919566, 8.526074358))
            Line((6.147919566, 8.526074358), (6.188556951, 8.526074358))
            add(Edge.make_bspline(
                [(6.188556951, 8.526074358), (6.205577159, 8.527720052), (6.239159171, 8.530967116), (6.287056432, 8.549864065), (6.329590258, 8.580707723), (6.366968243, 8.621478537), (6.397891455, 8.670380899), (6.420584179, 8.726364845), (6.43490877, 8.788136271), (6.437056701, 8.831523519), (6.438650796, 8.853748234)],
                knots=[0, 0, 0, 0, 0.898603461, 1.773004862, 2.677306445, 3.648329679, 4.673844513, 5.712296624, 6.821212649, 8, 8, 8, 8], degree=3))
        make_face(mode=Mode.SUBTRACT)
    # profile 6 of 9: a face of its own
    with BuildSketch(Plane(origin=(-6.3, -79.273, 0), x_dir=(1, 0, 0), z_dir=(0, 0, 1))):
        with BuildLine():
            add(Edge.make_bspline(
                [(5.297885267, 9.994650387), (5.285663922, 9.995617746), (5.261797149, 9.997506878), (5.228302511, 10.010481951), (5.198197768, 10.030038224), (5.172169974, 10.056448047), (5.150548194, 10.088315929), (5.134907212, 10.125089242), (5.125022169, 10.165995965), (5.123394871, 10.1947328), (5.122553712, 10.20958703)],
                knots=[0, 0, 0, 0, 0.952500454, 1.860115524, 2.76835155, 3.737588794, 4.733789719, 5.757030911, 6.840596767, 8, 8, 8, 8], degree=3))
            add(Edge.make_bspline(
                [(5.122553712, 10.20958703), (5.123373835, 10.224121578), (5.124950783, 10.252068898), (5.135064238, 10.291957662), (5.150693454, 10.328006807), (5.171994215, 10.359818426), (5.19839059, 10.385664978), (5.228179351, 10.405405081), (5.261826355, 10.417659853), (5.285542709, 10.419418856), (5.297675663, 10.420318737)],
                knots=[0, 0, 0, 0, 1.147542827, 2.206518294, 3.230096122, 4.238088033, 5.209758914, 6.128744777, 7.042692104, 8, 8, 8, 8], degree=3))
            Line((5.297675663, 10.420318737), (6.457770937, 10.420162487))
            Line((6.457770937, 10.420162487), (6.457770937, 10.797044633))
            Line((6.457770937, 10.797044633), (6.392135934, 10.801102845))
            add(Edge.make_bspline(
                [(6.392135934, 10.801102845), (6.380224509, 10.802284931), (6.35691377, 10.804598281), (6.32369963, 10.816805465), (6.293978949, 10.836266682), (6.268321676, 10.86243765), (6.246508391, 10.893525303), (6.23181882, 10.929808422), (6.221484504, 10.969519034), (6.219941531, 10.997482901), (6.219139078, 11.012026054)],
                knots=[0, 0, 0, 0, 0.948528589, 1.85627681, 2.781254506, 3.750078175, 4.753964502, 5.779095098, 6.844975137, 8, 8, 8, 8], degree=3))
            add(Edge.make_bspline(
                [(6.219139078, 11.012026054), (6.219966992, 11.026885979), (6.221568665, 11.055633832), (6.231617639, 11.096401347), (6.246642894, 11.133515987), (6.268190689, 11.165357413), (6.293666599, 11.192300862), (6.32398333, 11.210875536), (6.35662959, 11.224142444), (6.379983292, 11.225813228), (6.391822005, 11.226660201)],
                knots=[0, 0, 0, 0, 1.167236176, 2.258122618, 3.283272399, 4.296810141, 5.263602734, 6.171074471, 7.0728612, 8, 8, 8, 8], degree=3))
            Line((6.391822005, 11.226660201), (6.621091726, 11.226614945))
            add(Edge.make_bspline(
                [(6.621091726, 11.226614945), (6.633743546, 11.225821478), (6.658374494, 11.224276733), (6.69278238, 11.21090232), (6.724508364, 11.192369115), (6.751584916, 11.165611208), (6.773837438, 11.133428448), (6.790930208, 11.096767389), (6.800497641, 11.05558566), (6.802174658, 11.026869564), (6.803041517, 11.012026054)],
                knots=[0, 0, 0, 0, 0.96755155, 1.883658949, 2.8020597, 3.773156842, 4.777385176, 5.79395093, 6.859680931, 8, 8, 8, 8], degree=3))
            Line((6.803041517, 11.012026054), (6.803528845, 10.209695166))
            add(Edge.make_bspline(
                [(6.803528845, 10.209695166), (6.802441017, 10.19466115), (6.800328033, 10.165459281), (6.791054795, 10.123533799), (6.773830961, 10.086258221), (6.751607805, 10.053575917), (6.724518772, 10.02639998), (6.69292592, 10.007186392), (6.658321308, 9.994075557), (6.633731671, 9.992077588), (6.621090297, 9.991050444)],
                knots=[0, 0, 0, 0, 1.145322919, 2.224659683, 3.242510005, 4.247064397, 5.21726748, 6.133115094, 7.040246537, 8, 8, 8, 8], degree=3))
            Line((6.621090297, 9.991050444), (5.297885267, 9.994650387))
        make_face()
    # profile 7 of 9: a face of its own
    with BuildSketch(Plane(origin=(-6.3, -79.273, 0), x_dir=(1, 0, 0), z_dir=(0, 0, 1))):
        with BuildLine():
            add(Edge.make_bspline(
                [(6.803528845, 11.85808541), (6.802453204, 11.843371231), (6.800364723, 11.81480196), (6.790865012, 11.773599298), (6.773857617, 11.736592102), (6.751492416, 11.703839606), (6.724392035, 11.676400946), (6.69322578, 11.655877381), (6.658249227, 11.643125012), (6.633714234, 11.640692357), (6.621090297, 11.639440688)],
                knots=[0, 0, 0, 0, 1.124238703, 2.182838799, 3.203883666, 4.211590874, 5.193567112, 6.125580558, 7.035559052, 8, 8, 8, 8], degree=3))
            Line((6.621090297, 11.639440688), (5.29706162, 11.639440212))
            add(Edge.make_bspline(
                [(5.29706162, 11.639440212), (5.285128166, 11.640710656), (5.261746617, 11.643199872), (5.228406826, 11.655923182), (5.198668491, 11.676467083), (5.17316631, 11.704085537), (5.151492162, 11.736505927), (5.136589329, 11.773962061), (5.126430825, 11.814852122), (5.124839626, 11.843603389), (5.124017127, 11.858465079)],
                knots=[0, 0, 0, 0, 0.931310382, 1.824742527, 2.744686518, 3.720752625, 4.735457786, 5.762797711, 6.843577658, 8, 8, 8, 8], degree=3))
            add(Edge.make_bspline(
                [(5.124017127, 11.858465079), (5.124839743, 11.873164628), (5.126430795, 11.901595568), (5.13658273, 11.942008048), (5.15152053, 11.978970068), (5.173044499, 12.010860866), (5.198695663, 12.037688536), (5.228702736, 12.056912232), (5.261527232, 12.070063131), (5.284867932, 12.071754177), (5.296700053, 12.07261142)],
                knots=[0, 0, 0, 0, 1.157147383, 2.238081277, 3.265574424, 4.281428989, 5.25043155, 6.166893773, 7.070741875, 8, 8, 8, 8], degree=3))
            Line((5.296700053, 12.07261142), (6.438650796, 12.072610944))
            Line((6.438650796, 12.072610944), (6.438650796, 12.451146576))
            Line((6.438650796, 12.451146576), (5.29706162, 12.451146576))
            add(Edge.make_bspline(
                [(5.29706162, 12.451146576), (5.285110624, 12.452194615), (5.261672435, 12.45425002), (5.228714021, 12.467318468), (5.19853614, 12.486567335), (5.173051318, 12.513926859), (5.151519575, 12.546268931), (5.136410279, 12.583998844), (5.126464506, 12.625606184), (5.124850849, 12.654990497), (5.124017127, 12.670172396)],
                knots=[0, 0, 0, 0, 0.926626821, 1.817292426, 2.720388176, 3.684305139, 4.695868235, 5.720026971, 6.822013624, 8, 8, 8, 8], degree=3))
            add(Edge.make_bspline(
                [(5.124017127, 12.670172396), (5.124839743, 12.684871946), (5.126430795, 12.713302885), (5.13658273, 12.753715365), (5.15152053, 12.790677385), (5.173044499, 12.822568183), (5.198695663, 12.849395853), (5.228702736, 12.868619549), (5.261527232, 12.881770448), (5.284867932, 12.883461494), (5.296700053, 12.884318737)],
                knots=[0, 0, 0, 0, 1.157147383, 2.238081277, 3.265574424, 4.281428989, 5.25043155, 6.166893773, 7.070741875, 8, 8, 8, 8], degree=3))
            Line((5.296700053, 12.884318737), (6.438650796, 12.884317308))
            Line((6.438650796, 12.884317308), (6.438650796, 13.07561304))
            add(Edge.make_bspline(
                [(6.438650796, 13.07561304), (6.437741001, 13.088327191), (6.435979659, 13.112941466), (6.426984943, 13.147982696), (6.413300785, 13.180091393), (6.393798575, 13.208037222), (6.370615912, 13.23147926), (6.34415911, 13.249459477), (6.314140653, 13.259744567), (6.293193558, 13.261807486), (6.282553712, 13.262855323)],
                knots=[0, 0, 0, 0, 1.133331057, 2.194100189, 3.205786612, 4.226143022, 5.209230685, 6.129053034, 7.049673098, 8, 8, 8, 8], degree=3))
            Line((6.282553712, 13.262855323), (5.29706162, 13.262853417))
            add(Edge.make_bspline(
                [(5.29706162, 13.262853417), (5.285110629, 13.263901656), (5.261672472, 13.26595745), (5.228714016, 13.279025753), (5.198536141, 13.298274662), (5.173051318, 13.325634173), (5.151519575, 13.357976248), (5.136410279, 13.395706161), (5.126464506, 13.437313501), (5.124850849, 13.466697814), (5.124017127, 13.481879713)],
                knots=[0, 0, 0, 0, 0.926628306, 1.817293724, 2.720389285, 3.684306045, 4.695868928, 5.720027449, 6.822013871, 8, 8, 8, 8], degree=3))
            add(Edge.make_bspline(
                [(5.124017127, 13.481879713), (5.124839743, 13.496579263), (5.126430795, 13.525010202), (5.13658273, 13.565422682), (5.15152053, 13.602384702), (5.173044499, 13.6342755), (5.198695663, 13.66110317), (5.228702736, 13.680326867), (5.261527232, 13.693477765), (5.284867932, 13.695168811), (5.296700053, 13.696026054)],
                knots=[0, 0, 0, 0, 1.157147383, 2.238081277, 3.265574424, 4.281428989, 5.25043155, 6.166893773, 7.070741875, 8, 8, 8, 8], degree=3))
            Line((5.296700053, 13.696026054), (6.282628502, 13.696024149))
            add(Edge.make_bspline(
                [(6.282628502, 13.696024149), (6.300376324, 13.694971656), (6.33549334, 13.692889123), (6.386872336, 13.682622836), (6.43652779, 13.66840842), (6.483438677, 13.647507882), (6.528388392, 13.621856748), (6.571181094, 13.59109393), (6.612142147, 13.555251346), (6.649717902, 13.513908824), (6.68403072, 13.468682532), (6.715187771, 13.420911691), (6.740994702, 13.369762779), (6.762461108, 13.316036183), (6.779509788, 13.259719807), (6.792375494, 13.200874277), (6.79997878, 13.139296882), (6.802009512, 13.097345493), (6.803041517, 13.076026054)],
                knots=[0, 0, 0, 0, 0.952233279, 1.884151937, 2.802761483, 3.716350927, 4.63014836, 5.573739761, 6.537457744, 7.543283183, 8.563404039, 9.57915637, 10.596852582, 11.629784227, 12.677838629, 13.748354147, 14.855727349, 16, 16, 16, 16], degree=3))
            Line((6.803041517, 13.076026054), (6.803528845, 11.85808541))
        make_face()
    # profile 8 of 9: a face of its own
    with BuildSketch(Plane(origin=(-6.3, -79.273, 0), x_dir=(1, 0, 0), z_dir=(0, 0, 1))):
        with BuildLine():
            add(Edge.make_bspline(
                [(5.127431761, 15.406739564), (5.128250913, 15.4216385), (5.129824967, 15.450267786), (5.139987455, 15.491339304), (5.155825325, 15.528793285), (5.178604209, 15.561218999), (5.204929139, 15.589206891), (5.236568776, 15.608684818), (5.270919484, 15.622428384), (5.295427639, 15.624391366), (5.307919566, 15.625391908)],
                knots=[0, 0, 0, 0, 1.138391563, 2.187494374, 3.217350047, 4.227515487, 5.203137744, 6.130703494, 7.047210442, 8, 8, 8, 8], degree=3))
            Line((5.307919566, 15.625391908), (6.291713392, 15.625390479))
            add(Edge.make_bspline(
                [(6.291713392, 15.625390479), (6.308867609, 15.624316545), (6.342905699, 15.622185603), (6.392850416, 15.612160832), (6.44096297, 15.597017466), (6.487135949, 15.576399814), (6.53106353, 15.550225758), (6.573526799, 15.519553342), (6.612968684, 15.482274024), (6.650727192, 15.440872892), (6.685194179, 15.39516224), (6.715559581, 15.346417948), (6.740937961, 15.294624835), (6.762478088, 15.240525704), (6.779580523, 15.183566014), (6.792313901, 15.124044719), (6.800013093, 15.061673095), (6.802018642, 15.019232616), (6.803041517, 14.99758703)],
                knots=[0, 0, 0, 0, 0.922317431, 1.830099563, 2.727784821, 3.626955787, 4.539138448, 5.470190716, 6.434285936, 7.448277375, 8.477092017, 9.504682652, 10.527996367, 11.570802117, 12.629000666, 13.718417642, 14.836342377, 16, 16, 16, 16], degree=3))
            Line((6.803041517, 14.99758703), (6.803528845, 14.450195166))
            add(Edge.make_bspline(
                [(6.803528845, 14.450195166), (6.802459879, 14.435541011), (6.800391703, 14.407188982), (6.790867678, 14.366360445), (6.773829881, 14.329853465), (6.751609977, 14.297619969), (6.724359723, 14.270985635), (6.692938069, 14.251786347), (6.658351051, 14.238550361), (6.63373536, 14.236947172), (6.621090297, 14.236123615)],
                knots=[0, 0, 0, 0, 1.129782201, 2.185838543, 3.204775682, 4.211346622, 5.184709083, 6.111776475, 7.030020916, 8, 8, 8, 8], degree=3))
            add(Edge.make_bspline(
                [(6.621090297, 14.236123615), (6.608452947, 14.23697021), (6.583698882, 14.23862852), (6.548870841, 14.251660345), (6.517334393, 14.270997897), (6.490094241, 14.297619155), (6.467813863, 14.329843327), (6.450997992, 14.366438948), (6.440525051, 14.407105623), (6.438967597, 14.435572318), (6.438163468, 14.450269957)],
                knots=[0, 0, 0, 0, 0.968098369, 1.896312966, 2.821582845, 3.793058031, 4.797677307, 5.814638806, 6.871676196, 8, 8, 8, 8], degree=3))
            Line((6.438163468, 14.450269957), (6.438650796, 14.99725881))
            add(Edge.make_bspline(
                [(6.438650796, 14.99725881), (6.437610392, 15.010559949), (6.435597738, 15.036290877), (6.42840625, 15.073447925), (6.414121165, 15.106417751), (6.396526996, 15.135764902), (6.374520661, 15.159924545), (6.349341234, 15.177966869), (6.321140695, 15.189266271), (6.301350591, 15.191228188), (6.2913342, 15.192221176)],
                knots=[0, 0, 0, 0, 1.187953173, 2.29808409, 3.34926507, 4.369694808, 5.332756954, 6.236435166, 7.107404559, 8, 8, 8, 8], degree=3))
            Line((6.2913342, 15.192221176), (6.147919566, 15.192219747))
            Line((6.147919566, 15.192219747), (6.147919566, 14.723505951))
            add(Edge.make_bspline(
                [(6.147919566, 14.723505951), (6.146944933, 14.701994963), (6.145026907, 14.659662472), (6.136607554, 14.597661238), (6.123927297, 14.538288549), (6.106940991, 14.481612699), (6.085303528, 14.427624339), (6.059496868, 14.376287701), (6.029112924, 14.327791118), (5.994602601, 14.282603562), (5.956919087, 14.241594951), (5.917100708, 14.204975885), (5.875367673, 14.173706586), (5.831255149, 14.148076625), (5.785462951, 14.127258469), (5.73713869, 14.11292887), (5.687186271, 14.102672709), (5.653010497, 14.100591116), (5.635724444, 14.099538249)],
                knots=[0, 0, 0, 0, 1.159621346, 2.282073675, 3.36623681, 4.427652734, 5.465490474, 6.495833095, 7.519113245, 8.54407935, 9.554682138, 10.515778448, 11.454864929, 12.357832699, 13.259737528, 14.15754897, 15.068091147, 16, 16, 16, 16], degree=3))
            add(Edge.make_bspline(
                [(5.635724444, 14.099538249), (5.618435072, 14.100576251), (5.584412195, 14.102618882), (5.534660062, 14.113023238), (5.48657786, 14.127130218), (5.441086988, 14.148239244), (5.397093531, 14.173533144), (5.355797397, 14.205170259), (5.315992164, 14.241431833), (5.278775096, 14.282622458), (5.244848096, 14.327953269), (5.214251408, 14.376134808), (5.189238795, 14.427780418), (5.167239086, 14.481499473), (5.151147367, 14.538394925), (5.138045627, 14.597603732), (5.130485218, 14.659849091), (5.12846309, 14.702285158), (5.127431761, 14.723928493)],
                knots=[0, 0, 0, 0, 0.933937943, 1.837849168, 2.737615458, 3.633475768, 4.538409613, 5.472512593, 6.435701544, 7.442589812, 8.464484128, 9.489992315, 10.518652226, 11.5587497, 12.619974019, 13.706497755, 14.83026297, 16, 16, 16, 16], degree=3))
            Line((5.127431761, 14.723928493), (5.127431761, 15.406739564))
        make_face()
        with BuildLine():
            Line((5.492309809, 15.192219747), (5.492309809, 14.723505951))
            add(Edge.make_bspline(
                [(5.492309809, 14.723505951), (5.493121393, 14.710764704), (5.494696036, 14.686044016), (5.502425299, 14.650347773), (5.515686632, 14.617849848), (5.533679104, 14.589284067), (5.554904773, 14.564994201), (5.579553615, 14.547128096), (5.606848713, 14.535645403), (5.626024821, 14.533695352), (5.635724444, 14.532708981)],
                knots=[0, 0, 0, 0, 1.165164728, 2.260663639, 3.319814879, 4.354202631, 5.332356577, 6.247471425, 7.113539359, 8, 8, 8, 8], degree=3))
            add(Edge.make_bspline(
                [(5.635724444, 14.532708981), (5.645741156, 14.533701772), (5.665531893, 14.535663301), (5.693727712, 14.546965599), (5.718926044, 14.564996325), (5.74076174, 14.589100305), (5.758548299, 14.617986923), (5.772584115, 14.650216373), (5.780157132, 14.686200862), (5.781735761, 14.711052086), (5.782553712, 14.723928493)],
                knots=[0, 0, 0, 0, 0.904803131, 1.787684443, 2.703721919, 3.679955502, 4.701880229, 5.753913799, 6.836213376, 8, 8, 8, 8], degree=3))
            Line((5.782553712, 14.723928493), (5.78304104, 15.192219747))
            Line((5.78304104, 15.192219747), (5.492309809, 15.192219747))
        make_face(mode=Mode.SUBTRACT)
    # profile 9 of 9: a face of its own
    with BuildSketch(Plane(origin=(-6.3, -79.273, 0), x_dir=(1, 0, 0), z_dir=(0, 0, 1))):
        with BuildLine():
            add(Edge.make_bspline(
                [(5.29706162, 15.997684114), (5.285137414, 15.998793291), (5.261808238, 16.000963346), (5.228430407, 16.013139619), (5.198867046, 16.033222391), (5.173013077, 16.059867599), (5.151529207, 16.091829033), (5.136580275, 16.128771443), (5.126431473, 16.169189443), (5.124839974, 16.197619595), (5.124017127, 16.212318737)],
                knots=[0, 0, 0, 0, 0.93873466, 1.836592346, 2.758521699, 3.725871878, 4.739994166, 5.76573519, 6.844825832, 8, 8, 8, 8], degree=3))
            add(Edge.make_bspline(
                [(5.124017127, 16.212318737), (5.124828081, 16.227506098), (5.126389214, 16.256742654), (5.1365971, 16.298274467), (5.151412496, 16.3360768), (5.172869687, 16.36861144), (5.198879071, 16.395308032), (5.228427299, 16.41540384), (5.261695663, 16.427529995), (5.284898638, 16.429734218), (5.296700053, 16.430855323)],
                knots=[0, 0, 0, 0, 1.180402834, 2.272344245, 3.310301957, 4.323940119, 5.280768684, 6.192670453, 7.080762377, 8, 8, 8, 8], degree=3))
            Line((5.296700053, 16.430855323), (6.438650796, 16.430854846))
            Line((6.438650796, 16.430854846), (6.438650796, 16.895405151))
            add(Edge.make_bspline(
                [(6.438650796, 16.895405151), (6.437733848, 16.908737198), (6.43595508, 16.934599737), (6.427057206, 16.971406044), (6.413428351, 17.005002031), (6.39395637, 17.033999868), (6.370623203, 17.057979972), (6.344207298, 17.076426582), (6.314232056, 17.087373226), (6.293205902, 17.089360654), (6.282553712, 17.090367518)],
                knots=[0, 0, 0, 0, 1.159685753, 2.249648344, 3.275816407, 4.294856521, 5.264181539, 6.16959342, 7.072686418, 8, 8, 8, 8], degree=3))
            Line((6.282553712, 17.090367518), (5.29706162, 17.090366089))
            add(Edge.make_bspline(
                [(5.29706162, 17.090366089), (5.285137425, 17.091475665), (5.261808313, 17.093646499), (5.228430398, 17.105822481), (5.198867049, 17.125905337), (5.173013076, 17.15255052), (5.151529207, 17.184511961), (5.136580275, 17.22145437), (5.126431473, 17.26187237), (5.124839974, 17.290302521), (5.124017127, 17.305001664)],
                knots=[0, 0, 0, 0, 0.938737662, 1.836594966, 2.758523927, 3.725873695, 4.739995552, 5.76573614, 6.844826323, 8, 8, 8, 8], degree=3))
            add(Edge.make_bspline(
                [(5.124017127, 17.305001664), (5.124815517, 17.319870442), (5.126351582, 17.348477237), (5.13678986, 17.389270267), (5.151338077, 17.426873422), (5.173214057, 17.459320175), (5.198490529, 17.487125893), (5.228685304, 17.506818127), (5.261459449, 17.520501905), (5.284857908, 17.522517925), (5.296700053, 17.523538249)],
                knots=[0, 0, 0, 0, 1.158481191, 2.228860663, 3.269760859, 4.28627256, 5.264076417, 6.178563316, 7.078156451, 8, 8, 8, 8], degree=3))
            Line((5.296700053, 17.523538249), (6.282628502, 17.52353682))
            add(Edge.make_bspline(
                [(6.282628502, 17.52353682), (6.300371501, 17.522469065), (6.335478961, 17.520356335), (6.386974268, 17.51029998), (6.436412179, 17.495249984), (6.483611913, 17.474685226), (6.528199279, 17.448244482), (6.57152998, 17.417717375), (6.611959555, 17.380732041), (6.649738512, 17.338997332), (6.684189086, 17.293187922), (6.715049774, 17.244583033), (6.741021153, 17.192890007), (6.762447938, 17.138658027), (6.779588908, 17.081716254), (6.792311575, 17.022189979), (6.800013709, 16.959819723), (6.80201885, 16.917379054), (6.803041517, 16.895733371)],
                knots=[0, 0, 0, 0, 0.945503137, 1.870834552, 2.785453535, 3.692585294, 4.60424965, 5.541171298, 6.509599164, 7.514710447, 8.534515116, 9.557694688, 10.575918121, 11.60959137, 12.658522613, 13.738398885, 14.846533254, 16, 16, 16, 16], degree=3))
            Line((6.803041517, 16.895733371), (6.803528845, 16.212203932))
            add(Edge.make_bspline(
                [(6.803528845, 16.212203932), (6.802458785, 16.197563602), (6.800387587, 16.169225942), (6.79087007, 16.128405013), (6.773821668, 16.091917346), (6.751639742, 16.059613846), (6.724192212, 16.033167624), (6.693202816, 16.013094395), (6.658187922, 16.000894354), (6.633704838, 15.998776027), (6.621090297, 15.997684591)],
                knots=[0, 0, 0, 0, 1.128341958, 2.184006302, 3.202565221, 4.208762531, 5.181763689, 6.115130827, 7.028849497, 8, 8, 8, 8], degree=3))
            Line((6.621090297, 15.997684591), (5.29706162, 15.997684114))
        make_face()
    extrude(amount=CUT_EXTRUDE_1_DEPTH, mode=Mode.SUBTRACT)

    # 草图5 → 切除-拉伸2 (cut, through all)
    with BuildSketch(Plane.XZ.offset(79.473)):
        with Locations((0, -3.3)):
            Circle(SKETCH_5_R)
    extrude(amount=-CUT_EXTRUDE_2_DEPTH, mode=Mode.SUBTRACT)


solid = part_1.part
